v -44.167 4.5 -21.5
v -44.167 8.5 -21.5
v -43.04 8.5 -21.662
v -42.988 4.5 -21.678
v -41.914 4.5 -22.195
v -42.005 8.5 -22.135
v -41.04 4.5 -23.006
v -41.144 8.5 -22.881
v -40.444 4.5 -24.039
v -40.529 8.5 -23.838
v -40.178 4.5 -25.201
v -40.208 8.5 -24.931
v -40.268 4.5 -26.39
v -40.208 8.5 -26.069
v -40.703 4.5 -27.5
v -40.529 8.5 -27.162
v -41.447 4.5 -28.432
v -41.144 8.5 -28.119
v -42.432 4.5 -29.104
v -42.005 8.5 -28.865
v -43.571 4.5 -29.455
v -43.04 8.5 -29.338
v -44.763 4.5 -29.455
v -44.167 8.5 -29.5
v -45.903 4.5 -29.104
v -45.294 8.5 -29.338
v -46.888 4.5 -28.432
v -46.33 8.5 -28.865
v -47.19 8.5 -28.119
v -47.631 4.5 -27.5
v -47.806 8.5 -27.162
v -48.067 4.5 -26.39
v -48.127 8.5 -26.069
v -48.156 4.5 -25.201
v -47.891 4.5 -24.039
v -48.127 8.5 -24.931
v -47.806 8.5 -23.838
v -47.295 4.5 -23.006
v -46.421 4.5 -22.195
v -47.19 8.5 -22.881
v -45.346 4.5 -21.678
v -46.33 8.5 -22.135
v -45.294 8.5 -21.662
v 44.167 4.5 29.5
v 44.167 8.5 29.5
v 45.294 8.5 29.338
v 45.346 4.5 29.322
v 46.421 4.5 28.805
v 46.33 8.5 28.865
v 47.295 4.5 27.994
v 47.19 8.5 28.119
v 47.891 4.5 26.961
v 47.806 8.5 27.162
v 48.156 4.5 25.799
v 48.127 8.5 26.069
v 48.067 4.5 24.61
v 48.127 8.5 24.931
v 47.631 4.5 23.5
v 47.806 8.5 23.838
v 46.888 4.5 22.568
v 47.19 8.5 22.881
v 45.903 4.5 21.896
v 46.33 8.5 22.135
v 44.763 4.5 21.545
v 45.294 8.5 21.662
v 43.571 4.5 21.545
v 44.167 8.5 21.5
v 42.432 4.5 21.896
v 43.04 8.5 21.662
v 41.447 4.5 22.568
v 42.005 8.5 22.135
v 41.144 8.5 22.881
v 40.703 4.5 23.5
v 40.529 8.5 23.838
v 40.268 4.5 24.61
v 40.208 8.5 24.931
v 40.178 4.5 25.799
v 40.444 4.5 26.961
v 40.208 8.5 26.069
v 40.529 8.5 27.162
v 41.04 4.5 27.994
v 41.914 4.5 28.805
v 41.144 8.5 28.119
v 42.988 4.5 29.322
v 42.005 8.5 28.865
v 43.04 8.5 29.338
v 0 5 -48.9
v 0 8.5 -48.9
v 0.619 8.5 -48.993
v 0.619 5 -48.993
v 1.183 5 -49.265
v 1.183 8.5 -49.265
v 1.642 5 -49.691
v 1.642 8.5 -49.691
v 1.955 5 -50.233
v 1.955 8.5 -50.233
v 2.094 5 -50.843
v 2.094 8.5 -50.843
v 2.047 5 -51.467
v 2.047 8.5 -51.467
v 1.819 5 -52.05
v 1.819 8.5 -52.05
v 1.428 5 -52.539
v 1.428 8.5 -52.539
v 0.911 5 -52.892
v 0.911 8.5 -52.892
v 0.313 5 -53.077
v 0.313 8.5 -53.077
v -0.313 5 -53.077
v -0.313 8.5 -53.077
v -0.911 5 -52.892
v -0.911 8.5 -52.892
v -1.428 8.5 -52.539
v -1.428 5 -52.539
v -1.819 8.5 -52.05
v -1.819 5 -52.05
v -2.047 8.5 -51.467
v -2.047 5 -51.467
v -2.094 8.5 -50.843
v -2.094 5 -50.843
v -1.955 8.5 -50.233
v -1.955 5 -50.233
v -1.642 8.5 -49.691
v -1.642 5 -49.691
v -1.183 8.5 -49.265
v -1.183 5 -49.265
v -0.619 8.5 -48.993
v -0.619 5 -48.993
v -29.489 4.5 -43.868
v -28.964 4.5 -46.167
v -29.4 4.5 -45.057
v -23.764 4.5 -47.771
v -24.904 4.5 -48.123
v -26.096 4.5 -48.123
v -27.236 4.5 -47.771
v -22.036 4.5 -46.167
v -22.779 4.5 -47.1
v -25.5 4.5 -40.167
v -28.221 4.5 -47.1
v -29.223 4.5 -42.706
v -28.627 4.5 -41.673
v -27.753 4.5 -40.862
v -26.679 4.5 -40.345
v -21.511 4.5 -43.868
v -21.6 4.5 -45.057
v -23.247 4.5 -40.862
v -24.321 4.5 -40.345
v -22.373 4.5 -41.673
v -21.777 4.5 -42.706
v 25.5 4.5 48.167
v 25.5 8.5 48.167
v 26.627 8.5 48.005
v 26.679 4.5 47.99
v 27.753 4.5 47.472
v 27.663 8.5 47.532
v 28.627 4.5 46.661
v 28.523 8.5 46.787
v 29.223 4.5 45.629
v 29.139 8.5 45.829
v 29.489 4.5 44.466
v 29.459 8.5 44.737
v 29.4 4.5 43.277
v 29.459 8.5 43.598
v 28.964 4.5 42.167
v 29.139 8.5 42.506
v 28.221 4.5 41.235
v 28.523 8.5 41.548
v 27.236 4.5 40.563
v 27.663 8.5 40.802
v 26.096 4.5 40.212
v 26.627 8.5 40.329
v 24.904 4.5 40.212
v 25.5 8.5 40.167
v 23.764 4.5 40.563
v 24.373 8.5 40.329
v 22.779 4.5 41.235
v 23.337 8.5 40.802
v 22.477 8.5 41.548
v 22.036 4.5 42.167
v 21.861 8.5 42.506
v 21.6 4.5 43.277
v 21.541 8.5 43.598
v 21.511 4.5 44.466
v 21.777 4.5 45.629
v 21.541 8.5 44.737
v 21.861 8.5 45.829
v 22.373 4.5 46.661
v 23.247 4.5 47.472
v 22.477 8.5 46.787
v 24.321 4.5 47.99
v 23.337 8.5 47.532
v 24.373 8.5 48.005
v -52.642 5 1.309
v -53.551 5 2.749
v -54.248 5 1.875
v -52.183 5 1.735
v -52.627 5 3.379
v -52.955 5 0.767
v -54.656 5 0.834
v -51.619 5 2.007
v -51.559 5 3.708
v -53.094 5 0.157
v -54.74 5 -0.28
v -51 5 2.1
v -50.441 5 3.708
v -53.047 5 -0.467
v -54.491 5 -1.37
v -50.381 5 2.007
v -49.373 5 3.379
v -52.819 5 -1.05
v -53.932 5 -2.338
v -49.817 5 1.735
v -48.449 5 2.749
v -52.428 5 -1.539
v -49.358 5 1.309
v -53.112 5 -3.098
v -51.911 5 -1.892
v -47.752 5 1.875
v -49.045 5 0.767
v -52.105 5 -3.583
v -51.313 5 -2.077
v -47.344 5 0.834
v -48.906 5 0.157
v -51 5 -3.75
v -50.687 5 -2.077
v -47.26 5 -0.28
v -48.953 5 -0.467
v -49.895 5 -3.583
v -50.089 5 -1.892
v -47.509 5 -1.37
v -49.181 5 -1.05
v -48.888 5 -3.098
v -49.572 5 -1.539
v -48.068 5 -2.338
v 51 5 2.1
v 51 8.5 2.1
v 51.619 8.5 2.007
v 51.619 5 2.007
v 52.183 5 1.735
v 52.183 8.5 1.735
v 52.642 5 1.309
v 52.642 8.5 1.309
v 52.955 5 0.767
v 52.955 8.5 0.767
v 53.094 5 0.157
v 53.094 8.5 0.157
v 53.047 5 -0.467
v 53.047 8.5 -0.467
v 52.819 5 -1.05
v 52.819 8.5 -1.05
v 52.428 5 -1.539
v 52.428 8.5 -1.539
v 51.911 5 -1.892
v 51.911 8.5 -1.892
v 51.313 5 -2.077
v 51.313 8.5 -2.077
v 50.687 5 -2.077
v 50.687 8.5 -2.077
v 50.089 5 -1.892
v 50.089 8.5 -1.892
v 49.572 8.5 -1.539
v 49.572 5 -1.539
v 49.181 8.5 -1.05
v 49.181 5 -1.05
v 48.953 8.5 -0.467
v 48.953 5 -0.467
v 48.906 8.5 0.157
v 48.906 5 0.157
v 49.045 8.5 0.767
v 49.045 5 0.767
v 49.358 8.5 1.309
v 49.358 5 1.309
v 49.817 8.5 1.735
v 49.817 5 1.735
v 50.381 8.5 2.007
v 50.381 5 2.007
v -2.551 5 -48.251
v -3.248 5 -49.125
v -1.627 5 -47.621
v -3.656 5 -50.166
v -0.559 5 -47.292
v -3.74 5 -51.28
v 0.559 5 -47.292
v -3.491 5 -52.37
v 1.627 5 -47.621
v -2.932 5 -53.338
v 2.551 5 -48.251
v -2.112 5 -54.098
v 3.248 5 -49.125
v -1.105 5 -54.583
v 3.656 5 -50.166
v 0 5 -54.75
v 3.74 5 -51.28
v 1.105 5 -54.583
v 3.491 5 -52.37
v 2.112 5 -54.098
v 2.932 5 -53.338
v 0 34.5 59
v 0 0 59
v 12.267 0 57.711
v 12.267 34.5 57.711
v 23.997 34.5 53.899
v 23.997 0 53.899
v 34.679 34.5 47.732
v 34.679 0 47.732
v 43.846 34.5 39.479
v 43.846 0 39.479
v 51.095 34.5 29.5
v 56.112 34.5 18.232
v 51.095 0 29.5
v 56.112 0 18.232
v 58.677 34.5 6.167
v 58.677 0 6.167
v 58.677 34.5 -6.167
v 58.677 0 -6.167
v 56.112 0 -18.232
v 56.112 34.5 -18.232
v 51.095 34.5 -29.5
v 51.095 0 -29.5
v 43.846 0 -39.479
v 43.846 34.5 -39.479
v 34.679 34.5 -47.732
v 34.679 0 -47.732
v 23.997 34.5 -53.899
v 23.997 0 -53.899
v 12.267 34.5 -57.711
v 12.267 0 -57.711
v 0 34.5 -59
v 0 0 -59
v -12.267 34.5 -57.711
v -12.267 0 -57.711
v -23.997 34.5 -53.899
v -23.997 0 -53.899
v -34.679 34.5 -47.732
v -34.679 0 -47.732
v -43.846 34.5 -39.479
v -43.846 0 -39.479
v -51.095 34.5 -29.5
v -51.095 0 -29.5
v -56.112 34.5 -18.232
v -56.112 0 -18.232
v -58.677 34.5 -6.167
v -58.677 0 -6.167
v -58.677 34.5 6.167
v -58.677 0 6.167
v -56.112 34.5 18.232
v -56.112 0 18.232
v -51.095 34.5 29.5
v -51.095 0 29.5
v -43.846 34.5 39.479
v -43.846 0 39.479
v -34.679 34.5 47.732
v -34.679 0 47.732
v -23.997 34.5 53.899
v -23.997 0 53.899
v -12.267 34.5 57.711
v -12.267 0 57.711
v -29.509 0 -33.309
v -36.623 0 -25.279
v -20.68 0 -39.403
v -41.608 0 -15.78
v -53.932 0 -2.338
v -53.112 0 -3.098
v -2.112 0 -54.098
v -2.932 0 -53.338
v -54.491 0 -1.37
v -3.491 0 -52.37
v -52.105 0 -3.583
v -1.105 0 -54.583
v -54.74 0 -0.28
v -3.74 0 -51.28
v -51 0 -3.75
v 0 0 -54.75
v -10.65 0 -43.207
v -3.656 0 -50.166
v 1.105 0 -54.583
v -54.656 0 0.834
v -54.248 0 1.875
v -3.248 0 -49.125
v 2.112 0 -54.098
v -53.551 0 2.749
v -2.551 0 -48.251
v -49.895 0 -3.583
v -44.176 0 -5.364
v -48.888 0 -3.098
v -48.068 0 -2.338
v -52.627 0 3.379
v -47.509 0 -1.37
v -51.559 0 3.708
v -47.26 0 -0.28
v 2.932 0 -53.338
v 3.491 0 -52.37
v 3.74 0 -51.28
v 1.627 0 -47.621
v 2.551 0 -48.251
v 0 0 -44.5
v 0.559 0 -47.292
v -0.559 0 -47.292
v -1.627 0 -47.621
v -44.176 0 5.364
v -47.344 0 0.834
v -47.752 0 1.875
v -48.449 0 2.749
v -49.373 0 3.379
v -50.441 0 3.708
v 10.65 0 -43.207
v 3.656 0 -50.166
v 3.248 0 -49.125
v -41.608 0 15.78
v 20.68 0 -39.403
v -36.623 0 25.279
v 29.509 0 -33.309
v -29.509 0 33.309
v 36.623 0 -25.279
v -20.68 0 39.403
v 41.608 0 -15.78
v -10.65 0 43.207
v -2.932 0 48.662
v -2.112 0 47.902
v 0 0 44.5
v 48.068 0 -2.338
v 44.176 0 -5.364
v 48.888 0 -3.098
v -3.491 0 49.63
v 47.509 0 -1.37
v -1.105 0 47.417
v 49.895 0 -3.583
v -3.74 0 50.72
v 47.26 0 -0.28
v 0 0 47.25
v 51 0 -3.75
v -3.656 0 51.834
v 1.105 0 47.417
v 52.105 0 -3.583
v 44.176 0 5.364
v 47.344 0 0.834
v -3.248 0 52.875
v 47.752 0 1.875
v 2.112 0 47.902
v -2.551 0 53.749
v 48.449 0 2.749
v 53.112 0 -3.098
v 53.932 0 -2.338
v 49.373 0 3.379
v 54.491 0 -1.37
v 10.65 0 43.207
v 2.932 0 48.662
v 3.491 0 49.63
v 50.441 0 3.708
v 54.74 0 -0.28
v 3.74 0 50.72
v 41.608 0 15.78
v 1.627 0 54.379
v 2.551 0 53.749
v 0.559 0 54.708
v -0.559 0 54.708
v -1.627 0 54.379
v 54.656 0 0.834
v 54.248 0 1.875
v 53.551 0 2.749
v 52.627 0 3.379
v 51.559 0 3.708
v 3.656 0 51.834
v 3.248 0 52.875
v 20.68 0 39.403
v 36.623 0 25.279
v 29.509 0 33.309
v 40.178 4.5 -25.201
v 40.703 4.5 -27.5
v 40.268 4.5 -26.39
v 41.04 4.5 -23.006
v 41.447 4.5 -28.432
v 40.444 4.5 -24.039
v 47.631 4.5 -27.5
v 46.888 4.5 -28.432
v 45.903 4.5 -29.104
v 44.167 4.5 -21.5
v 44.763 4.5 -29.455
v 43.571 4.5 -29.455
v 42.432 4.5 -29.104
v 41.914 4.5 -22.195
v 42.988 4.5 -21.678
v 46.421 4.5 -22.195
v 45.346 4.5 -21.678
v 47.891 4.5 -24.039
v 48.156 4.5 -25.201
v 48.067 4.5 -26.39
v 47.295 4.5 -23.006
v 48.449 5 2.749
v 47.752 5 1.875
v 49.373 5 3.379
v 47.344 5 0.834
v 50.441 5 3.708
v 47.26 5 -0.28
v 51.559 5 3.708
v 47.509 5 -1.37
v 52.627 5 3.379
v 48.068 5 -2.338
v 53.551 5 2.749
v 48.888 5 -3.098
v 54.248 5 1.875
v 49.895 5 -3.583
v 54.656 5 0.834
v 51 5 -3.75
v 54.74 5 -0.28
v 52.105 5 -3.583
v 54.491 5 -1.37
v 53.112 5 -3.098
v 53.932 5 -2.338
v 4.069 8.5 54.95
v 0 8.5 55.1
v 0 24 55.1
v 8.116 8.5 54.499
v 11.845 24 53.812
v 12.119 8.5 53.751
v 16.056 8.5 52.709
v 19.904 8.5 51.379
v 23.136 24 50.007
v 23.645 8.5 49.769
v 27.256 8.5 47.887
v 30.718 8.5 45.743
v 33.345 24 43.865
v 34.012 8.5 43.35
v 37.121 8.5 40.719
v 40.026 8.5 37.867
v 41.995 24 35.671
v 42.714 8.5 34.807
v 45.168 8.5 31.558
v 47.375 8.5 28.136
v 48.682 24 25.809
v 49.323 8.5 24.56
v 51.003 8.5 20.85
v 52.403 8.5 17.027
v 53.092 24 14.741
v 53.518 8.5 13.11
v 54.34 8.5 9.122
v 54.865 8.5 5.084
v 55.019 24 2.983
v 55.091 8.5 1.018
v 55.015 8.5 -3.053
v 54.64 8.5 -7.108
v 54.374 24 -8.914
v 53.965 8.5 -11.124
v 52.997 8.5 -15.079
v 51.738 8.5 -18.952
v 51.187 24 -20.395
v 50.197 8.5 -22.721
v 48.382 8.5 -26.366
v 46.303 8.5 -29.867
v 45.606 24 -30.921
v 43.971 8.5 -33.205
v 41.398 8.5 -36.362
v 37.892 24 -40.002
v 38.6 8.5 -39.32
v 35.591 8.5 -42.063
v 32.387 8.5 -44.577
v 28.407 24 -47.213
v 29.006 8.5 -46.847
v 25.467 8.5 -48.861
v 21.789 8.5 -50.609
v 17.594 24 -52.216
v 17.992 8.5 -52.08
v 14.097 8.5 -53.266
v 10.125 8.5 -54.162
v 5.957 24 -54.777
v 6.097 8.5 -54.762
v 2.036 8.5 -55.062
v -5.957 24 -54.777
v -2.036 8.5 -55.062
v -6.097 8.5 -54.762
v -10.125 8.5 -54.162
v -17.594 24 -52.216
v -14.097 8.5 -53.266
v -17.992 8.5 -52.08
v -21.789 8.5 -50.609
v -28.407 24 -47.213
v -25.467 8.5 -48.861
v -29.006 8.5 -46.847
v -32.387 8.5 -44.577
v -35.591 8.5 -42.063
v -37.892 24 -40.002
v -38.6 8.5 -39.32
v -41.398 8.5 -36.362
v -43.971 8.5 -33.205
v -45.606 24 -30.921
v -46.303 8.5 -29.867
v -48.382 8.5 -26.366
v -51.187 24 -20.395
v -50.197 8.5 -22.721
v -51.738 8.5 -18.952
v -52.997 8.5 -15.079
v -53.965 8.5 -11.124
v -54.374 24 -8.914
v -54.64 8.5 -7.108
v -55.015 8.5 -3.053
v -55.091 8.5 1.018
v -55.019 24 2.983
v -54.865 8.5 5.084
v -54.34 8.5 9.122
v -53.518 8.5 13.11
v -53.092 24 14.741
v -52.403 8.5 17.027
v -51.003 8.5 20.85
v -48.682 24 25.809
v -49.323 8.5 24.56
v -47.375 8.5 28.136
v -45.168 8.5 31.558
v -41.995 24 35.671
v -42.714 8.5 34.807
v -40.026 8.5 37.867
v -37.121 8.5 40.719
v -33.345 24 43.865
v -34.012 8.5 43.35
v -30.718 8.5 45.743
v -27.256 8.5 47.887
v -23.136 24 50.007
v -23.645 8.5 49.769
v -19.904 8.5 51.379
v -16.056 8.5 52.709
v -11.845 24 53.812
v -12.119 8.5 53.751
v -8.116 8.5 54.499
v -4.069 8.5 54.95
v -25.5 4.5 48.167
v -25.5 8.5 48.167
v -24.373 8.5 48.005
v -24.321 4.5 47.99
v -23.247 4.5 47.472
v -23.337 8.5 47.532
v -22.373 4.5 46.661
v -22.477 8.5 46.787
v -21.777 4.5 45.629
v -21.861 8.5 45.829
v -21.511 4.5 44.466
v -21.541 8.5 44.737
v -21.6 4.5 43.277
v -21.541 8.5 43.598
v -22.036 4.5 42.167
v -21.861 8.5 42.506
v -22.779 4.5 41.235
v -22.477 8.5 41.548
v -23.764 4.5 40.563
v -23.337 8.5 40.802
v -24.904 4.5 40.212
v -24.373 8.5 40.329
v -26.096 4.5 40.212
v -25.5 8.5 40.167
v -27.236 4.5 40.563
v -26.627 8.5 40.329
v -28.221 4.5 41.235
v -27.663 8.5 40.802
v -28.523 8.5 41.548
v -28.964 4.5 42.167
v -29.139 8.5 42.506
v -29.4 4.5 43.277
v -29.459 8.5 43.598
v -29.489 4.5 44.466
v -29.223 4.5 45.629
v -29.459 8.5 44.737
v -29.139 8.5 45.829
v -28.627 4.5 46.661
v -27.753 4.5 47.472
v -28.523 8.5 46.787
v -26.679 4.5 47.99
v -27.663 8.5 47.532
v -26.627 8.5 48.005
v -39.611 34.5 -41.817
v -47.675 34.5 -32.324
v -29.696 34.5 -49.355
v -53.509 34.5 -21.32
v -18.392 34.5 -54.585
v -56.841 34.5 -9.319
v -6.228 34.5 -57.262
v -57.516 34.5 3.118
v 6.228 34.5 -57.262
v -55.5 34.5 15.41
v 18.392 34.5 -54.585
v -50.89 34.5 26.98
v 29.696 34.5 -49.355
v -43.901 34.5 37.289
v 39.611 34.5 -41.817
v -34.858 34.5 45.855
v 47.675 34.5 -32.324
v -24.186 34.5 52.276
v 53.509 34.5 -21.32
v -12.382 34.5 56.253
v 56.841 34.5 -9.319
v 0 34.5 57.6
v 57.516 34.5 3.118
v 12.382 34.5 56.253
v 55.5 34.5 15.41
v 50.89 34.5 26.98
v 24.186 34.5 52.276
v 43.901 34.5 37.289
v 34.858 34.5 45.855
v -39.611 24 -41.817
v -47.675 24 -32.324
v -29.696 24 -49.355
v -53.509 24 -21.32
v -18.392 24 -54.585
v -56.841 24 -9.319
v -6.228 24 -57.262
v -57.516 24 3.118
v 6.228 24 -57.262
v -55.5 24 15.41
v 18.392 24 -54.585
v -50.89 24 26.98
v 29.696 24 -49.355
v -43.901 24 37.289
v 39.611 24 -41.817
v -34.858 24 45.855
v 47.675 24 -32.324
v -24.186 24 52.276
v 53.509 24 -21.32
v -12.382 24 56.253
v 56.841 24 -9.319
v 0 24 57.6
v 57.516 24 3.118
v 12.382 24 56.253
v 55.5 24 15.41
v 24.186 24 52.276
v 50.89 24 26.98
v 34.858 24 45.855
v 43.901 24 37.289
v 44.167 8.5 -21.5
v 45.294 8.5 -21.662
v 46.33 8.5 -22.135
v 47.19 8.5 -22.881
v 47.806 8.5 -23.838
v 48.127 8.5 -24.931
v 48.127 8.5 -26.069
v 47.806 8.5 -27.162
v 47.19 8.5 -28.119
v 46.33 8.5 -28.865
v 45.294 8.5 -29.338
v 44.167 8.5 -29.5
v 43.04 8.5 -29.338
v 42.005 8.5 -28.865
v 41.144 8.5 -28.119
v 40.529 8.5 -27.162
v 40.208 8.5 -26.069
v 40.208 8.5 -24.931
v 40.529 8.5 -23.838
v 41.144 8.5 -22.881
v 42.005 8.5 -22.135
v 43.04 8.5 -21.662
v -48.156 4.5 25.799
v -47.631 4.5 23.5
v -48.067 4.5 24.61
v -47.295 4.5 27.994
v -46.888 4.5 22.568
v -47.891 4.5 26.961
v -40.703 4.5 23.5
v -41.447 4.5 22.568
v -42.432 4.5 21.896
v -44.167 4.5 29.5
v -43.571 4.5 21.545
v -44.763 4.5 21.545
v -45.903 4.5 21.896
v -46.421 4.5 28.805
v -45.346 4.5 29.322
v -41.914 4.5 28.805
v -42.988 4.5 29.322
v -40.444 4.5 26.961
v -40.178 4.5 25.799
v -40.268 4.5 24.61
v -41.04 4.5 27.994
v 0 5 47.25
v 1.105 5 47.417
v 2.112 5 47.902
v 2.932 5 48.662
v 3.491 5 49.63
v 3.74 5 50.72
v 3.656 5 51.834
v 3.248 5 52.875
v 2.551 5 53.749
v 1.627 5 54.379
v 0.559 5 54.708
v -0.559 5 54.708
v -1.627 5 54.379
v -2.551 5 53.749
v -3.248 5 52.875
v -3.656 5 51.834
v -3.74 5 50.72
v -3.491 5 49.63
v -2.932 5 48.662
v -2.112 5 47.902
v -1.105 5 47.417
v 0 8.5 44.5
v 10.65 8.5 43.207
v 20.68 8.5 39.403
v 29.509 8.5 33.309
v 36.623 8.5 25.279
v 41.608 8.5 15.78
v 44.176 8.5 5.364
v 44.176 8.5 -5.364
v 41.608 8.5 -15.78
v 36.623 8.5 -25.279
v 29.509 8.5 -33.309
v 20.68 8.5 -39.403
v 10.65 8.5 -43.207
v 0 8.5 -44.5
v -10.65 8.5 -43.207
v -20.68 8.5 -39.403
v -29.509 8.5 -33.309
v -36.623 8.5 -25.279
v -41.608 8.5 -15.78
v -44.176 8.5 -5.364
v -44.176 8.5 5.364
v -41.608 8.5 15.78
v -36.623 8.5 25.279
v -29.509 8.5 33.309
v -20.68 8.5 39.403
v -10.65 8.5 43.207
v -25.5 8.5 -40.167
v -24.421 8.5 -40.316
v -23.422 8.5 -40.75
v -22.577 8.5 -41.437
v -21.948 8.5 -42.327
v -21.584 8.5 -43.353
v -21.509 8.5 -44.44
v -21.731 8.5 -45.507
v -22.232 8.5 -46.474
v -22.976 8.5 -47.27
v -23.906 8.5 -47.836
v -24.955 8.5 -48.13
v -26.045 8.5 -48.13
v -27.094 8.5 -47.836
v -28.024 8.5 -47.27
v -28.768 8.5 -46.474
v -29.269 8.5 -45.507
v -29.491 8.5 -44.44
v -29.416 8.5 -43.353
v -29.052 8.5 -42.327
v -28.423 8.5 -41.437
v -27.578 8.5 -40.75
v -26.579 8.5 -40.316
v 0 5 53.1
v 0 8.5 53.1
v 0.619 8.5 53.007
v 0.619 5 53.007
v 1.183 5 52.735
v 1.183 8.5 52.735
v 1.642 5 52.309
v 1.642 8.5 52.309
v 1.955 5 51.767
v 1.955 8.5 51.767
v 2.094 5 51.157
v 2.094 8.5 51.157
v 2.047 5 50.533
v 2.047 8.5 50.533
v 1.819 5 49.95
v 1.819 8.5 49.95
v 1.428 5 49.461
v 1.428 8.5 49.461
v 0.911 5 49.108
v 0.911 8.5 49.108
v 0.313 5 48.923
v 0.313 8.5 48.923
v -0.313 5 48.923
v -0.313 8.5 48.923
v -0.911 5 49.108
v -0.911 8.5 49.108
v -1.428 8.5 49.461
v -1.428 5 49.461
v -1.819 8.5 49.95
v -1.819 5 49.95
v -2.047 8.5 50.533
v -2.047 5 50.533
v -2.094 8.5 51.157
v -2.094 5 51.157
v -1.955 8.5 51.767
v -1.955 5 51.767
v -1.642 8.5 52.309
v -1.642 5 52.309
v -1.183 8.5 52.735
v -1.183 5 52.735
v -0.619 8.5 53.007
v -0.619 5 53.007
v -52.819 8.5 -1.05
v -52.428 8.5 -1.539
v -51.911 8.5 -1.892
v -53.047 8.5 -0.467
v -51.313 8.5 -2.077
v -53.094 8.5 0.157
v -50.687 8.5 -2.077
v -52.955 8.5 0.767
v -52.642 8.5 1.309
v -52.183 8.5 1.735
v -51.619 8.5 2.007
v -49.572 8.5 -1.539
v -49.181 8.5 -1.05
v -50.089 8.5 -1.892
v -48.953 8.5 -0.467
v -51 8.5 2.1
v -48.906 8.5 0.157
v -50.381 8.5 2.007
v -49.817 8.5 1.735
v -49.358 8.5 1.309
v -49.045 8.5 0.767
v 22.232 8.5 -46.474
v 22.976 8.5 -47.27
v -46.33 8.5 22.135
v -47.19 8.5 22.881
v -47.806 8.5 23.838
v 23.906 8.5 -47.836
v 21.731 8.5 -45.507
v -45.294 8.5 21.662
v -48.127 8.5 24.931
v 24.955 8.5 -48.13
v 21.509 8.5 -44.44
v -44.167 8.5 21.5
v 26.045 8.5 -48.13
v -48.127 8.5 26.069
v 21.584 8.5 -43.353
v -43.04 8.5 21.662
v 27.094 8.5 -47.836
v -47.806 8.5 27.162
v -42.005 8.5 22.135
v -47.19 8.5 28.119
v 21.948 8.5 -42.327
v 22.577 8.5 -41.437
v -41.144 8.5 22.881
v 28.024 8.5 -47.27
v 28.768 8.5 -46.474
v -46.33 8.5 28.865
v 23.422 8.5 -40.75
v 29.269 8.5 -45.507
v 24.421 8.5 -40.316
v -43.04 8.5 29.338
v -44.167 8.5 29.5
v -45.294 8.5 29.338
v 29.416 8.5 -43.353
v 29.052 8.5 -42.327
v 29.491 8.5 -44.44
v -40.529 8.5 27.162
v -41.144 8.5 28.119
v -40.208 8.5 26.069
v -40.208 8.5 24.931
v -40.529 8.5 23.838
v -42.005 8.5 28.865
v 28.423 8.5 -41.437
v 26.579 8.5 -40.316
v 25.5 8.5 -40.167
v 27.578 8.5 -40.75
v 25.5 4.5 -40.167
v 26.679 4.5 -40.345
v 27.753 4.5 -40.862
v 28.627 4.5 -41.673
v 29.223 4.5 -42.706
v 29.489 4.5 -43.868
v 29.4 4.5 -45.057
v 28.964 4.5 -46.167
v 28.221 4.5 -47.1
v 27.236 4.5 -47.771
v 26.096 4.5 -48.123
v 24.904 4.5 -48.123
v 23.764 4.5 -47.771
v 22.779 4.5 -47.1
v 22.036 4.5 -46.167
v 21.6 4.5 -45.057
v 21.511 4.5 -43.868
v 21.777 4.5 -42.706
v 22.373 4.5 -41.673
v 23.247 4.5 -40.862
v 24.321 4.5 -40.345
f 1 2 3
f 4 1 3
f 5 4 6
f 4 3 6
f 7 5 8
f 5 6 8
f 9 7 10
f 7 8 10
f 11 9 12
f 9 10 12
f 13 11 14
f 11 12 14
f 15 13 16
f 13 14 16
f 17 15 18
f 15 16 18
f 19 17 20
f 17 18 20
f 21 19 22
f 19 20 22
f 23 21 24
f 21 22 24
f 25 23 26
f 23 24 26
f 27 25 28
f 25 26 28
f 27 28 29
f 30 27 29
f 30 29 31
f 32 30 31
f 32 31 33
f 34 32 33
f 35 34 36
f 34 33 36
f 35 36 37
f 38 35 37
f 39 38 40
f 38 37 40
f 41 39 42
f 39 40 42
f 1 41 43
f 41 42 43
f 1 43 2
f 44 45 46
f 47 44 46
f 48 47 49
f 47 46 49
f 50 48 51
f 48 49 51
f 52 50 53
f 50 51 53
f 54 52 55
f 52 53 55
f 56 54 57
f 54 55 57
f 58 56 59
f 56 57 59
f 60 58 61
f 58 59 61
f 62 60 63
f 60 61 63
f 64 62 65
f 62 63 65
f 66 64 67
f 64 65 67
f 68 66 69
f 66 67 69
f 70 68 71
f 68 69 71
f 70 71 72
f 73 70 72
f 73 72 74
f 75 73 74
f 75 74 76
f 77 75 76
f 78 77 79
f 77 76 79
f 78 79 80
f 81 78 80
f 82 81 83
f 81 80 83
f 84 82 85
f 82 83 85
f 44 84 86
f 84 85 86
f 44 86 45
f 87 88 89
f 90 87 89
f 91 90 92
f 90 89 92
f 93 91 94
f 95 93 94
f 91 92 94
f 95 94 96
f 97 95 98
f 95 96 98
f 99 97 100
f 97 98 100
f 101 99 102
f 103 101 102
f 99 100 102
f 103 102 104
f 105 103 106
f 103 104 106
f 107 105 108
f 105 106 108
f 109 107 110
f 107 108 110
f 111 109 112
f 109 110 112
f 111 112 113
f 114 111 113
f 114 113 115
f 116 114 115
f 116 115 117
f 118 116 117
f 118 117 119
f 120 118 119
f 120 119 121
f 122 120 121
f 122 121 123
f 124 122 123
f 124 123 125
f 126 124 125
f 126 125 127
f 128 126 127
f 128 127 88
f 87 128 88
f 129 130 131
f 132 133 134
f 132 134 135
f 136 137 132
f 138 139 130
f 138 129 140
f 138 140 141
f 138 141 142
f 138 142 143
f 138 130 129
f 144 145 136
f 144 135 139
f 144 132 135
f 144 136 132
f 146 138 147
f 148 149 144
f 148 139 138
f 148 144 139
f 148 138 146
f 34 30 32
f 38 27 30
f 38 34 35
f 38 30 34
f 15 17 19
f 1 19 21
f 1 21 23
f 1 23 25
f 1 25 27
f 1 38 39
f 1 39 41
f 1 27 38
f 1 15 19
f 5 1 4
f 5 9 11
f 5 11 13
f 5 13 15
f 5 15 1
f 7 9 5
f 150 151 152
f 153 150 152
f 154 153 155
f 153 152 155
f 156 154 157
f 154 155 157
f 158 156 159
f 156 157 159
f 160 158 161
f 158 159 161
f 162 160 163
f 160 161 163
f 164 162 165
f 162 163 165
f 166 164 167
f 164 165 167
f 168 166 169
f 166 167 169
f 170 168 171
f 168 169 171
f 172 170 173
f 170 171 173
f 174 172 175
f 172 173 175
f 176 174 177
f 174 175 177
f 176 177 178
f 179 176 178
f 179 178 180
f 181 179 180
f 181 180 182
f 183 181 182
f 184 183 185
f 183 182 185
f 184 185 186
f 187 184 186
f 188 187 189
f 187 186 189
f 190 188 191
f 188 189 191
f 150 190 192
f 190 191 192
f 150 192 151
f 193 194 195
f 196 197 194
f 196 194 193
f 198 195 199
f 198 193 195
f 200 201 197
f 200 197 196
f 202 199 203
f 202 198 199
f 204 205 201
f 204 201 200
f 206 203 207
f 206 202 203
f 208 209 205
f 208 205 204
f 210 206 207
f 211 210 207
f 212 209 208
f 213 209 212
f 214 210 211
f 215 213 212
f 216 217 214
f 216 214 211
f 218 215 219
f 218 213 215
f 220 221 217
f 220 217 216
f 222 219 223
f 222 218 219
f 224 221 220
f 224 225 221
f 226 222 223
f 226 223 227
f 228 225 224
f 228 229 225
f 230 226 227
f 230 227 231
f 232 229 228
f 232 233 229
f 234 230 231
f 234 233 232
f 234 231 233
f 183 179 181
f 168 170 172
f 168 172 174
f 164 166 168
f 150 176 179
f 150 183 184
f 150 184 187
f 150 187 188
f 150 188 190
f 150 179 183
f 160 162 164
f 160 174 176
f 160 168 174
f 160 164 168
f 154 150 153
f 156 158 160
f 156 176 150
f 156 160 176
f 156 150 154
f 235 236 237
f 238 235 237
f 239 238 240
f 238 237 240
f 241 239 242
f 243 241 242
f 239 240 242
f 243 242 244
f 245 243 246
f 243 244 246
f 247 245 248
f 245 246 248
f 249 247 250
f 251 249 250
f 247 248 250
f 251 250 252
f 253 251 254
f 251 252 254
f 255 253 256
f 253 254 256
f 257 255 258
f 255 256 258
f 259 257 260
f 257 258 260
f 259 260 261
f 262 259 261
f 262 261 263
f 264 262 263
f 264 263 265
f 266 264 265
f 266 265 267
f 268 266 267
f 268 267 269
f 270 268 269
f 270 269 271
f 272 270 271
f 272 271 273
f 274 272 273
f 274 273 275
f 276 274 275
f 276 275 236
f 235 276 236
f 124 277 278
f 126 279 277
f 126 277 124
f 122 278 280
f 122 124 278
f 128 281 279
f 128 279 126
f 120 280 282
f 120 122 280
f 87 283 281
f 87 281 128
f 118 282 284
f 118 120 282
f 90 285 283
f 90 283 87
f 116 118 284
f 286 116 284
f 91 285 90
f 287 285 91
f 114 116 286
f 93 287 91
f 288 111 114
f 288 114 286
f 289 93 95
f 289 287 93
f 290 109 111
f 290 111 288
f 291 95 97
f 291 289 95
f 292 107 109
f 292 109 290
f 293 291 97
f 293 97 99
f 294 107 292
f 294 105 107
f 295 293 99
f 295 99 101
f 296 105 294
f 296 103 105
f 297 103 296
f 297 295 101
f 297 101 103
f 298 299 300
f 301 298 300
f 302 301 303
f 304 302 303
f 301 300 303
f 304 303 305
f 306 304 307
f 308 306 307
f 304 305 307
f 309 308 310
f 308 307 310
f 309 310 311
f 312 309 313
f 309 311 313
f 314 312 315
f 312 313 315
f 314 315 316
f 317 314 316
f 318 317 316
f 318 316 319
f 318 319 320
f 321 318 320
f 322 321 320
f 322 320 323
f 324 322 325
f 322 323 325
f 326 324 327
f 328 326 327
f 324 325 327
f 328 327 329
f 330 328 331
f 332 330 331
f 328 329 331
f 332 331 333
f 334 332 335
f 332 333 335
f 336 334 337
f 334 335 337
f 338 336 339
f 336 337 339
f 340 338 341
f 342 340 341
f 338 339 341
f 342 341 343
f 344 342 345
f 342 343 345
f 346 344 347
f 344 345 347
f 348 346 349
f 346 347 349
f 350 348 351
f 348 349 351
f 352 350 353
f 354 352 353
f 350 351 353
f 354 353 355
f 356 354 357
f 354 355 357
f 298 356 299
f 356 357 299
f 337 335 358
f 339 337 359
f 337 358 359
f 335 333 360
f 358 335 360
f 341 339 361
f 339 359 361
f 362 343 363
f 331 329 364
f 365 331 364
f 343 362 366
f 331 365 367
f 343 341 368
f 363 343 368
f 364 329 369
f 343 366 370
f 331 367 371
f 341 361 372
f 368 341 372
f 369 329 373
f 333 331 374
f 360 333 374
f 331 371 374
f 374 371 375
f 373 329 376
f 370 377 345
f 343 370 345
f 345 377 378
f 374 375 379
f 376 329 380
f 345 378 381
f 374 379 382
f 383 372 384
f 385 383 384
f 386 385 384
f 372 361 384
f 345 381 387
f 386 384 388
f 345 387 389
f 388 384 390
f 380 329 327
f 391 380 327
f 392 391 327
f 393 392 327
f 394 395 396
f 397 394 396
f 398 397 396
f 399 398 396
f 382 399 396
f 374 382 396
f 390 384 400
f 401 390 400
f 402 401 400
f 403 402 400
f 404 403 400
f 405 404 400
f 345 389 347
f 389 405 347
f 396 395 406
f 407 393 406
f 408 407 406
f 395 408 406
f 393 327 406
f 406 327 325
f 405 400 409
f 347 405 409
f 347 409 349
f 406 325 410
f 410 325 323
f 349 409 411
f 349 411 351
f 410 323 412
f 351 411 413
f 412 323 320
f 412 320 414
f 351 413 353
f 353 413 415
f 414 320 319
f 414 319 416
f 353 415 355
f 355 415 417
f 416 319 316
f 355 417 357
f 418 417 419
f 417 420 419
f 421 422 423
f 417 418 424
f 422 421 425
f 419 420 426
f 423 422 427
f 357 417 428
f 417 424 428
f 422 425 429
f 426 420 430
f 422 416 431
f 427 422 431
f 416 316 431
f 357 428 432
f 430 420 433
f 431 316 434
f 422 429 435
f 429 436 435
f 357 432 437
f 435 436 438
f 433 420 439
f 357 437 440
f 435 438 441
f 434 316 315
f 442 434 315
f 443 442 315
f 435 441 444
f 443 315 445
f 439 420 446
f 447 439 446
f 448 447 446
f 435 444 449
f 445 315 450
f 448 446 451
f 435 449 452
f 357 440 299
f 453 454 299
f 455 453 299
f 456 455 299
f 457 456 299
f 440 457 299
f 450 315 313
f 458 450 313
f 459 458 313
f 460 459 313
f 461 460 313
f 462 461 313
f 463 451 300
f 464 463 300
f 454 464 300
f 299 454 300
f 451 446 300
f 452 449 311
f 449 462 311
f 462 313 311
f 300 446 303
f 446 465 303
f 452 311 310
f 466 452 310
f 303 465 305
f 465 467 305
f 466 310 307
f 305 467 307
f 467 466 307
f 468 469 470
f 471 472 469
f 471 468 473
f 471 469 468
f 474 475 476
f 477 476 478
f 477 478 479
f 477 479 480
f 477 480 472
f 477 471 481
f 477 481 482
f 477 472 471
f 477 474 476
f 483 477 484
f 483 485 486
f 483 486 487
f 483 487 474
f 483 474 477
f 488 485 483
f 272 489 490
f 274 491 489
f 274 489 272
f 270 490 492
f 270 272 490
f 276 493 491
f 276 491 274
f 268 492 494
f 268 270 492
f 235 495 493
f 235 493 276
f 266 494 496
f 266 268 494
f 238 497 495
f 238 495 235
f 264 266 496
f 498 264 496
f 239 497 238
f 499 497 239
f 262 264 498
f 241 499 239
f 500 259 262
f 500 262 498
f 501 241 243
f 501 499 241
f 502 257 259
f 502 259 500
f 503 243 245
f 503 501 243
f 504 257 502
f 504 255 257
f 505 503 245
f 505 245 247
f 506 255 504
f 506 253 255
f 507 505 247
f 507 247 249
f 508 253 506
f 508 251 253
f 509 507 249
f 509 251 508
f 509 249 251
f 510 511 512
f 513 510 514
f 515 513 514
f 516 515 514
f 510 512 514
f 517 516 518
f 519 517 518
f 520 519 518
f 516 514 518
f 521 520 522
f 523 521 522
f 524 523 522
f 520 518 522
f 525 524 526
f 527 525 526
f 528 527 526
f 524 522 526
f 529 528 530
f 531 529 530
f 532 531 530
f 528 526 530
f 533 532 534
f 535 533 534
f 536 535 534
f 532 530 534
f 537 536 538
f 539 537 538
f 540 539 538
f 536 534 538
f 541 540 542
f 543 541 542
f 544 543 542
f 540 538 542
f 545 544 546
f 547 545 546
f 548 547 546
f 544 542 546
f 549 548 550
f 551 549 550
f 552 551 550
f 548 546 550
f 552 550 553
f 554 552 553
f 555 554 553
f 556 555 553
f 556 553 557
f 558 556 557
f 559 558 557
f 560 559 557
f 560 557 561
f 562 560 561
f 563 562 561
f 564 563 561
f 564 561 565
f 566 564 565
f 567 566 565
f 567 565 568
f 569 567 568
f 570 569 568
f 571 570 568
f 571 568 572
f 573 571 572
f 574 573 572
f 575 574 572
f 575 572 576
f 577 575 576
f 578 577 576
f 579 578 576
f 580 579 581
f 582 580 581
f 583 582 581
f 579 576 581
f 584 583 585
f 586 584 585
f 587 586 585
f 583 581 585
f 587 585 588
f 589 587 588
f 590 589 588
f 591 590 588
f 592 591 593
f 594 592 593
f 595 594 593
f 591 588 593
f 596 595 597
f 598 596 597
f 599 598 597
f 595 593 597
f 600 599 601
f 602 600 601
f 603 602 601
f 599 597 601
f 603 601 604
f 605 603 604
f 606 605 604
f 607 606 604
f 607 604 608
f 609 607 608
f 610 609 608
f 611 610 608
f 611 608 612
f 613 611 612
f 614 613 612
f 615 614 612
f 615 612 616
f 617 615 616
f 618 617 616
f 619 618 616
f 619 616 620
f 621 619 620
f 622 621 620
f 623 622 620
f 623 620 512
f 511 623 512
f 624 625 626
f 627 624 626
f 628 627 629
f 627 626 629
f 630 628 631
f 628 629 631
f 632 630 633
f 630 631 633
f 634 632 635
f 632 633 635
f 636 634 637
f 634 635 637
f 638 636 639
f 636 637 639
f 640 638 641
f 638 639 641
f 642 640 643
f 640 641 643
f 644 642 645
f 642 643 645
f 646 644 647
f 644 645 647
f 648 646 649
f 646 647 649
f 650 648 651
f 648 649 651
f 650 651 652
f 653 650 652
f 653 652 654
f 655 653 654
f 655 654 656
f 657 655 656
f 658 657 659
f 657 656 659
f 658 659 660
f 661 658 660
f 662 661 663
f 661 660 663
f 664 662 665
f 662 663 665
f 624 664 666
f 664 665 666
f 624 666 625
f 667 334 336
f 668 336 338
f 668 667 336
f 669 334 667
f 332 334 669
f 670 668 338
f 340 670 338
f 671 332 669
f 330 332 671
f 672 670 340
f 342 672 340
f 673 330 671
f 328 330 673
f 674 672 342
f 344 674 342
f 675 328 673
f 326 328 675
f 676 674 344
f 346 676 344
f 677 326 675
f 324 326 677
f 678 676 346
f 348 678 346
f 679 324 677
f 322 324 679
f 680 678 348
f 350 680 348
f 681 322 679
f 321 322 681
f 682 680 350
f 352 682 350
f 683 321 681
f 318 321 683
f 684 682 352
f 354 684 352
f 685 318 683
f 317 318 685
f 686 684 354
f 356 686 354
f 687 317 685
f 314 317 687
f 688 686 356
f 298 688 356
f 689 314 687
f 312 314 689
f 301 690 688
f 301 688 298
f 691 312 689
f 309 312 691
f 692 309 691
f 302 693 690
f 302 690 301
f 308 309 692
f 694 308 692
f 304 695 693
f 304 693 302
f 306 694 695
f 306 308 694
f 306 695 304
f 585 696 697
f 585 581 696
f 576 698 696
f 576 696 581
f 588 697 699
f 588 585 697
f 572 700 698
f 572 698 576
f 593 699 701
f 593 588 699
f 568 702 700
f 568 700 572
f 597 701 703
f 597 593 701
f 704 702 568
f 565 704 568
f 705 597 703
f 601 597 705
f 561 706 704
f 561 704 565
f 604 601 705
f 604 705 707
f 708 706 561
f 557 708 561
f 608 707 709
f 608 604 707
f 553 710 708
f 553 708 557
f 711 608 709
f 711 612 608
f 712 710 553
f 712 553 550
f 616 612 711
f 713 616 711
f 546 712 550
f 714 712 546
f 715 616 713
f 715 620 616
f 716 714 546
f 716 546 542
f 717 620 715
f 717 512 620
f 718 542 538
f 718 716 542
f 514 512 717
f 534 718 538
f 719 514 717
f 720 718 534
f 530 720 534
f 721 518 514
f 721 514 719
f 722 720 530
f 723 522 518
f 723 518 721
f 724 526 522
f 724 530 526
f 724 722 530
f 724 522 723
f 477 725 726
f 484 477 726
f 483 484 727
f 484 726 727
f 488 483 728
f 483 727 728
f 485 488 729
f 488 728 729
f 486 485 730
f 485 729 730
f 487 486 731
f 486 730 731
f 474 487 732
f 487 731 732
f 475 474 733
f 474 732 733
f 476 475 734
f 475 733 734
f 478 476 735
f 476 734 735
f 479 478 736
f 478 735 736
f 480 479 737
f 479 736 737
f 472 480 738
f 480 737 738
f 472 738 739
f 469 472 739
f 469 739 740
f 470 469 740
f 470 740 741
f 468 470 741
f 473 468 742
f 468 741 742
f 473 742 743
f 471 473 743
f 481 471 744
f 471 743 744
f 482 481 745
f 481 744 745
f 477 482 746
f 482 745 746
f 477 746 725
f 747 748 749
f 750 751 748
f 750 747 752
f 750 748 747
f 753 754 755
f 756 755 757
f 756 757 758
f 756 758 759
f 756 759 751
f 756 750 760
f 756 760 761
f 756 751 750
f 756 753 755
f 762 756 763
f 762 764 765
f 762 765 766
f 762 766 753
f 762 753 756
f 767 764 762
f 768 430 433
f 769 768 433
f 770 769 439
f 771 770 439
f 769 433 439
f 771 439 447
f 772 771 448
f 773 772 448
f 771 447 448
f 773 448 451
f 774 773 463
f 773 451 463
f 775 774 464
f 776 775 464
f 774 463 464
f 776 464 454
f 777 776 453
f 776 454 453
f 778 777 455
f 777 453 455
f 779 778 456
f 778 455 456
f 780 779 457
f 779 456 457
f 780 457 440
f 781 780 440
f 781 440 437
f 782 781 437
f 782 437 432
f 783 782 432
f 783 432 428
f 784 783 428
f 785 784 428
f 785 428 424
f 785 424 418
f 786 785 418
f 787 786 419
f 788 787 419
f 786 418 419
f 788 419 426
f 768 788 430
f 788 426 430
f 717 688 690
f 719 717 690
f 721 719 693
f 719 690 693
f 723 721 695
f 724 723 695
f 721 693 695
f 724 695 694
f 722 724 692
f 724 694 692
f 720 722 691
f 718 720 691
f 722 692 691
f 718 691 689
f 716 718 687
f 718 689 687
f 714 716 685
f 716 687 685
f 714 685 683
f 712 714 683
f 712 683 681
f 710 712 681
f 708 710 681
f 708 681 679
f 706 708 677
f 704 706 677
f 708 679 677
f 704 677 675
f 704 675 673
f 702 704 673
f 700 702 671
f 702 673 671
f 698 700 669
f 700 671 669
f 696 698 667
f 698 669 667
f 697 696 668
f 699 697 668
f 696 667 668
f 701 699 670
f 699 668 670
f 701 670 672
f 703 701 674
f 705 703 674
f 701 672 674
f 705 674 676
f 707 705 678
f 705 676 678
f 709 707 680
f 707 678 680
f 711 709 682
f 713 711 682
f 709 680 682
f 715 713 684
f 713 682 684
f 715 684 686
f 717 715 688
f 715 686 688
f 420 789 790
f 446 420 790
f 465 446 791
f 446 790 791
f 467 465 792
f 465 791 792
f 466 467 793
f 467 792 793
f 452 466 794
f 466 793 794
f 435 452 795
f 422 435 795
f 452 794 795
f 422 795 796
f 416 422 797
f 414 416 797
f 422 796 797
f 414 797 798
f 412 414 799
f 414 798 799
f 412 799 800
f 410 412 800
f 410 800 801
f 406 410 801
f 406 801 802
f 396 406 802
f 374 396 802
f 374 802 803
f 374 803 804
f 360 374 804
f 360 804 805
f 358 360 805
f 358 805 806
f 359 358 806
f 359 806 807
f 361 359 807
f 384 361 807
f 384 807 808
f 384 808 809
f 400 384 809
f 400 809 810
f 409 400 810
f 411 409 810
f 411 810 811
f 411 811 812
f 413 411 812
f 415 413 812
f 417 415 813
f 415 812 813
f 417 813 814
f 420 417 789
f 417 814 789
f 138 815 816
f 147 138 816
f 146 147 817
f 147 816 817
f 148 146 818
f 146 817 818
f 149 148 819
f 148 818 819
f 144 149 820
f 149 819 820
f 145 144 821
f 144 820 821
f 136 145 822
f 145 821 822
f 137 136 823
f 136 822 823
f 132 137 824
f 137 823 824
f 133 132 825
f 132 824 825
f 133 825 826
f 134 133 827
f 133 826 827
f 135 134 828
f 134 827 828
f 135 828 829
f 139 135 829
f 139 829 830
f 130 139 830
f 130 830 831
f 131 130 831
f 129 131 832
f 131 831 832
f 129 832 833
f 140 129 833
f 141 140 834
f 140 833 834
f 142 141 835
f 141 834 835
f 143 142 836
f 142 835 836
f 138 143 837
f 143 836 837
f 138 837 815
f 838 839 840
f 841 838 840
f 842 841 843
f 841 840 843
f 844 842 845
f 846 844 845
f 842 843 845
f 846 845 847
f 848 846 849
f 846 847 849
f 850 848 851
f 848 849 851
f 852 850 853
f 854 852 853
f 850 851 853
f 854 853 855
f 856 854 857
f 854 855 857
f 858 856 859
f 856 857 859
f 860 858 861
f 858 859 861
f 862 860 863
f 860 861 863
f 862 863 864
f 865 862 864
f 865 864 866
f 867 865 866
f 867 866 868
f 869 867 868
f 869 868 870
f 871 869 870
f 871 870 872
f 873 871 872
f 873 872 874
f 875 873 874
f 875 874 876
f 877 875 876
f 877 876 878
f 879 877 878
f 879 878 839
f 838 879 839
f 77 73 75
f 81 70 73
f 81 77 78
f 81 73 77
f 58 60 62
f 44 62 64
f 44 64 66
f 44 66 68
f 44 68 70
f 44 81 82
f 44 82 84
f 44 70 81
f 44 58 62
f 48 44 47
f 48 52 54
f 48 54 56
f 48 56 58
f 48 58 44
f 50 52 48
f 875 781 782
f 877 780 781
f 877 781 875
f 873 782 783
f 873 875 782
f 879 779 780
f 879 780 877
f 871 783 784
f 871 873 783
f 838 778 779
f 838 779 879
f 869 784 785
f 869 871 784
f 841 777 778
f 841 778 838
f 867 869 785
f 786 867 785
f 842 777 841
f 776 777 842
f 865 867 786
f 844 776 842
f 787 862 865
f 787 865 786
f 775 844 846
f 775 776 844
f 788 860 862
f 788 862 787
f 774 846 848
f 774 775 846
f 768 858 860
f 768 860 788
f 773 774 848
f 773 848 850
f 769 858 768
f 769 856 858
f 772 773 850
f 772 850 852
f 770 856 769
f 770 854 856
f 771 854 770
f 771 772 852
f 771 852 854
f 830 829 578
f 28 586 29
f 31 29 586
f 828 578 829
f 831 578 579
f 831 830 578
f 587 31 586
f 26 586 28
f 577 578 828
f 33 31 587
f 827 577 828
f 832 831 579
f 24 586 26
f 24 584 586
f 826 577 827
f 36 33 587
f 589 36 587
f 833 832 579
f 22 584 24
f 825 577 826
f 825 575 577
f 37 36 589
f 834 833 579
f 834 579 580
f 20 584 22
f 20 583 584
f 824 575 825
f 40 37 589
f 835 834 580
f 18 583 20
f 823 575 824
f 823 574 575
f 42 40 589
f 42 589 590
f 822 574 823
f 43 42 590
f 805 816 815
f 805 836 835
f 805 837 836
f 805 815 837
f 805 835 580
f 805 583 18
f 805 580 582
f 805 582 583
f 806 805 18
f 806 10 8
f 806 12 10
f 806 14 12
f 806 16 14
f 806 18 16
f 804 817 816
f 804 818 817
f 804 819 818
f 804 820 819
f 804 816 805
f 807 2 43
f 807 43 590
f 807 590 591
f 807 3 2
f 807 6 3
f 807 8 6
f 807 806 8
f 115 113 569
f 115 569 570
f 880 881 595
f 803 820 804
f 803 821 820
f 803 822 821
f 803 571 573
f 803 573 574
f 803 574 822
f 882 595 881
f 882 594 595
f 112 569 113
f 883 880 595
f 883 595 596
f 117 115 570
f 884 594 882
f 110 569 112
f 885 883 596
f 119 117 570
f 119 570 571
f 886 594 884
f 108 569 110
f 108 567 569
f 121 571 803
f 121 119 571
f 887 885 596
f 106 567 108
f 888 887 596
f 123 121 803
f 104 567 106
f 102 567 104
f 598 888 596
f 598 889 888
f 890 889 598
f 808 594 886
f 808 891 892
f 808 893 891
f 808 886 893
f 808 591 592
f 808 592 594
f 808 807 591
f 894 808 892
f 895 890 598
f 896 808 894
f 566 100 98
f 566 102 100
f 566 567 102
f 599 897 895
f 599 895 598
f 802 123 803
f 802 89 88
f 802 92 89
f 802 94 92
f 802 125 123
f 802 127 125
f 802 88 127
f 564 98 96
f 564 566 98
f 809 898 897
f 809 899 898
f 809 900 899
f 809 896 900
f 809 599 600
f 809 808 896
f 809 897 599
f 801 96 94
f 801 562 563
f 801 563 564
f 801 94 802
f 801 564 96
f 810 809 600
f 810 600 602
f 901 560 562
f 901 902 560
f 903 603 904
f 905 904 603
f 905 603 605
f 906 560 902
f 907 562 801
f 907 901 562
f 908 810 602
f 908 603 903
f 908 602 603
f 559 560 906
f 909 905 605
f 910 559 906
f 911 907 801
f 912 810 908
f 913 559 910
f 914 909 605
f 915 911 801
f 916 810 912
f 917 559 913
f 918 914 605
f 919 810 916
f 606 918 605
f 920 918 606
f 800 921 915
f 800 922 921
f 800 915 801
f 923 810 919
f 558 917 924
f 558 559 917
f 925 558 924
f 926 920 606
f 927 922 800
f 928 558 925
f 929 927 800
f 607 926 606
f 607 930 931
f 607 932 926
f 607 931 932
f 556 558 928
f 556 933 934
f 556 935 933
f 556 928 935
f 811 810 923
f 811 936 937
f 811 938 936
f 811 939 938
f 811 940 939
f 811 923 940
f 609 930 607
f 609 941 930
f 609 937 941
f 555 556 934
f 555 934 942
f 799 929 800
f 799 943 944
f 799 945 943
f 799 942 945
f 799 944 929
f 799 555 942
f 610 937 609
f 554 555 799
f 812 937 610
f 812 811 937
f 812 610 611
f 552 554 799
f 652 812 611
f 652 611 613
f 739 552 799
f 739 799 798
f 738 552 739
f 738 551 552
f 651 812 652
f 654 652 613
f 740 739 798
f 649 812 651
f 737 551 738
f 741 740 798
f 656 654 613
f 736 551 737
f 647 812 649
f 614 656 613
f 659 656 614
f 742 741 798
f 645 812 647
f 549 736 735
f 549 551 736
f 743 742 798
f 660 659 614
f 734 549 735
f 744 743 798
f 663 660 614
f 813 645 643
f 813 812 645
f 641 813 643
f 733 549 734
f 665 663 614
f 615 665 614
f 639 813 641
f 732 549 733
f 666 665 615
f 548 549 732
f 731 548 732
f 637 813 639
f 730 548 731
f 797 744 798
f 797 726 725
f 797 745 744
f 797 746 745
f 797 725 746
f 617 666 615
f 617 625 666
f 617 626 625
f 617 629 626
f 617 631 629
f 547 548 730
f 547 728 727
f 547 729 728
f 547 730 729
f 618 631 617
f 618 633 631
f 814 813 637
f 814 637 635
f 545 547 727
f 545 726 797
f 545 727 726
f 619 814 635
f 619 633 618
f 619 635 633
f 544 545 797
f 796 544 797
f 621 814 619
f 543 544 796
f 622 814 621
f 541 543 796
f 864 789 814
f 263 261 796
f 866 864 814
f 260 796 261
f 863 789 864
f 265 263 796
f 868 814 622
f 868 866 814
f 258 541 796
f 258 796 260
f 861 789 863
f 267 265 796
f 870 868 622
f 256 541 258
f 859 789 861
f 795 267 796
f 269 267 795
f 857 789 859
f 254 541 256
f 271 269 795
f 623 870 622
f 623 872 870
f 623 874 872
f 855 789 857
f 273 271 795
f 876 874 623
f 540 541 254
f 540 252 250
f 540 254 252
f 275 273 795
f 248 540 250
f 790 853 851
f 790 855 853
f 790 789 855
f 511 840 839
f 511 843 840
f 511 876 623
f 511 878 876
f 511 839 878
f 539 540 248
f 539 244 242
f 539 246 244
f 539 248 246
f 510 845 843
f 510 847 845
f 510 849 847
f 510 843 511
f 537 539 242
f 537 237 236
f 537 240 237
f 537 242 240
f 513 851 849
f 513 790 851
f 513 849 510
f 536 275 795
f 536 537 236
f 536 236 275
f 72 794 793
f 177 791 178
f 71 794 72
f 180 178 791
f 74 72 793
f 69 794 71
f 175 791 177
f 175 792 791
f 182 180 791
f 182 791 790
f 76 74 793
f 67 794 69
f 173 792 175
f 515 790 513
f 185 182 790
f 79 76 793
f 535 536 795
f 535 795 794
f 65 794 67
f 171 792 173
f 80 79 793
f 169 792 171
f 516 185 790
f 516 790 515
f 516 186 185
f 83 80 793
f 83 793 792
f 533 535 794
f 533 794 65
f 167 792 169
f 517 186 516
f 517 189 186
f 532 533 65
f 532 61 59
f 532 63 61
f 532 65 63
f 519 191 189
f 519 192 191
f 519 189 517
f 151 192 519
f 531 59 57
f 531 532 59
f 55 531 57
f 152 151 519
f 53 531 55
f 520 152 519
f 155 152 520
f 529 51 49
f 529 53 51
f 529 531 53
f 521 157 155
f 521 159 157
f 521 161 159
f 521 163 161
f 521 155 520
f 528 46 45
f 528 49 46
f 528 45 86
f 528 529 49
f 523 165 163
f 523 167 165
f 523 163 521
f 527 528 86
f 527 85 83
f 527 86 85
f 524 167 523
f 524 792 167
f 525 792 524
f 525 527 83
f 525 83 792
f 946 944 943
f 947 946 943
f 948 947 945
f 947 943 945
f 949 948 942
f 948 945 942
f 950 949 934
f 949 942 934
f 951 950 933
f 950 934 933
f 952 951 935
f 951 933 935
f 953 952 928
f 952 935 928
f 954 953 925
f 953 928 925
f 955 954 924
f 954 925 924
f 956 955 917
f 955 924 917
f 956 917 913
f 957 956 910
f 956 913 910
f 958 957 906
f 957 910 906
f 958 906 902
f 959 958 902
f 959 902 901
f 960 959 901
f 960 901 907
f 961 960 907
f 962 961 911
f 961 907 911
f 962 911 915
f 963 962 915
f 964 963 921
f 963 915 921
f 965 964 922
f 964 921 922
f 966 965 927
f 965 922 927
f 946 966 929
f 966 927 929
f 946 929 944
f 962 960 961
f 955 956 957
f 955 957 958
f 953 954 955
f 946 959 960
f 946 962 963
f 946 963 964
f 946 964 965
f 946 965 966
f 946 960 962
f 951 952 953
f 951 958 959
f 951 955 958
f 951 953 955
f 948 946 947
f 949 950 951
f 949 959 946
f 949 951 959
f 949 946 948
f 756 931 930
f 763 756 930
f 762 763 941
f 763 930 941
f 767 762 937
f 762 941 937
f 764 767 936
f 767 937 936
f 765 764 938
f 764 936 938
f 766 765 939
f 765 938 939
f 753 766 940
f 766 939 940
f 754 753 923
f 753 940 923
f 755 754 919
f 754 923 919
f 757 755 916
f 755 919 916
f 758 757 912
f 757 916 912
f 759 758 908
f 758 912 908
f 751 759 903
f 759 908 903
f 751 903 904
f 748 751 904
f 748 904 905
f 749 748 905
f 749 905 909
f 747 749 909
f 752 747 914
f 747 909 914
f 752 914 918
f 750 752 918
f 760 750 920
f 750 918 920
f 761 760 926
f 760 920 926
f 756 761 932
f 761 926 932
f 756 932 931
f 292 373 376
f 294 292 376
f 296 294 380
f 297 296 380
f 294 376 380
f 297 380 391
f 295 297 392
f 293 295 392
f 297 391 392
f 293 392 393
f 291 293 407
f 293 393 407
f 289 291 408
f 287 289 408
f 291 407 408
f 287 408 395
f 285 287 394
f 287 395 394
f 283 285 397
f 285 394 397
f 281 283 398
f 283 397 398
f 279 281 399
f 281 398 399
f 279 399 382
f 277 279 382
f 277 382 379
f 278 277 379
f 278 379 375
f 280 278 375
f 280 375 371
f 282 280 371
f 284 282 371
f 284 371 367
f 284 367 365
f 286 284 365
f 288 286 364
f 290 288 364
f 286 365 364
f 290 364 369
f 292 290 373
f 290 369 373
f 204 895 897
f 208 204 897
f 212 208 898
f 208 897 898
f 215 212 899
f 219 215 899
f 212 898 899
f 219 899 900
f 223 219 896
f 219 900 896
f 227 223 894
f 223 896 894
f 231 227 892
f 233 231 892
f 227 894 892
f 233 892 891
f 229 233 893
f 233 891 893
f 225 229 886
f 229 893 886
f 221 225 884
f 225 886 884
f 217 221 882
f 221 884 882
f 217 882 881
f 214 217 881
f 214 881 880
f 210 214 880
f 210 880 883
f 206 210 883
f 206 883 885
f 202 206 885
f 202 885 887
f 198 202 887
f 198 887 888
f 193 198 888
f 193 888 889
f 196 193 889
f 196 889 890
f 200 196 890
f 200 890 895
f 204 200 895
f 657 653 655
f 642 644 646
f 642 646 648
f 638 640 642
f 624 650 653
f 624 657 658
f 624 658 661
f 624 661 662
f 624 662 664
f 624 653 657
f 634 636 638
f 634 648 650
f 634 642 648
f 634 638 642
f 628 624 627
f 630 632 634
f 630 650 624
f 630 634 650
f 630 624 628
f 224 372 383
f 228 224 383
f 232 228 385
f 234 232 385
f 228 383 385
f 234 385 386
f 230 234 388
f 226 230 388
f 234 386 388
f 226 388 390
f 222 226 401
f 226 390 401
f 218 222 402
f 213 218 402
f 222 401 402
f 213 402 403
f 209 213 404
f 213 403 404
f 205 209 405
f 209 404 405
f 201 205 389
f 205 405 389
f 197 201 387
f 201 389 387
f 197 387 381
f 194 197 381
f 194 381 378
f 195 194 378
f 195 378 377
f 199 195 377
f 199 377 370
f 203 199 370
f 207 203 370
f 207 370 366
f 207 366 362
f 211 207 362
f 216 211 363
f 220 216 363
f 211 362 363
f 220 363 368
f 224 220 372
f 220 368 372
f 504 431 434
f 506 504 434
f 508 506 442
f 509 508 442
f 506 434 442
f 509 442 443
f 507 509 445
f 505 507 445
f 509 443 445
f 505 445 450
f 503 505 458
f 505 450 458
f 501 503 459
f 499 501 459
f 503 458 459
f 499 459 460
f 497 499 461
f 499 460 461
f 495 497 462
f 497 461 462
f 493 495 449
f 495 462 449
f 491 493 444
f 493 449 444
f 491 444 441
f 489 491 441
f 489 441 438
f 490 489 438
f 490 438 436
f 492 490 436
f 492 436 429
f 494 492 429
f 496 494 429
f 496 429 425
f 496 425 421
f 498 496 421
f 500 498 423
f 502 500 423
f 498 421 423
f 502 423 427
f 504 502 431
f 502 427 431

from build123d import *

# Parameters (mm, degrees)
SKETCH_1_R          = 59
EXTRUDE_1_DEPTH     = 34.5
SKETCH_2_R          = 57.6
CUT_EXTRUDE_1_DEPTH = 10.5
SKETCH_3_R          = 55.1
CUT_EXTRUDE_2_DEPTH = 15.5
SKETCH_4_R          = 44.5
CUT_EXTRUDE_3_DEPTH = 88.395652066
SKETCH_9_R          = 4
CUT_EXTRUDE_7_DEPTH = 4
SKETCH_10_R         = 2.1
CUT_EXTRUDE_8_DEPTH = 88.395652066
SKETCH_11_R         = 3.75
CUT_EXTRUDE_9_DEPTH = 5


with BuildPart() as part:
    # 草图1 → 凸台-拉伸1 (new body)
    with BuildSketch(Plane(origin=(0, 0, 0), x_dir=(1, 0, 0), z_dir=(0, 1, 0))):
        with Locations(Location((0, 0, 0), (0, 0, 270))):
            Circle(SKETCH_1_R)
    extrude(amount=EXTRUDE_1_DEPTH)

    # 草图2 → 切除-拉伸1 (cut)
    with BuildSketch(Plane(origin=(0, 34.5, 0), x_dir=(1, 0, 0), z_dir=(0, 1, 0))):
        with Locations(Location((0, 0, 0), (0, 0, 270))):
            Circle(SKETCH_2_R)
    extrude(amount=-CUT_EXTRUDE_1_DEPTH, mode=Mode.SUBTRACT)

    # 草图3 → 切除-拉伸2 (cut)
    with BuildSketch(Plane(origin=(0, 24, 0), x_dir=(1, 0, 0), z_dir=(0, 1, 0))):
        with Locations(Location((0, 0, 0), (0, 0, 270))):
            Circle(SKETCH_3_R)
    extrude(amount=-CUT_EXTRUDE_2_DEPTH, mode=Mode.SUBTRACT)

    # 草图4 → 切除-拉伸3 (cut, through all)
    with BuildSketch(Plane(origin=(0, 8.5, 0), x_dir=(1, 0, 0), z_dir=(0, 1, 0))):
        with Locations(Location((0, 0, 0), (0, 0, 270))):
            Circle(SKETCH_4_R)
    extrude(amount=-CUT_EXTRUDE_3_DEPTH, mode=Mode.SUBTRACT)

    # 草图9 → 切除-拉伸7 (cut)
    with BuildSketch(Plane(origin=(0, 8.5, 0), x_dir=(1, 0, 0), z_dir=(0, 1, 0))):
        with Locations(Location((-44.167295593, 25.5, 0), (0, 0, 270))):
            Circle(SKETCH_9_R)
        with Locations(Location((-25.5, 44.167295593, 0), (0, 0, 270))):
            Circle(SKETCH_9_R)
        with Locations(Location((25.5, 44.167295593, 0), (0, 0, 270))):
            Circle(SKETCH_9_R)
        with Locations(Location((44.167295593, 25.5, 0), (0, 0, 270))):
            Circle(SKETCH_9_R)
        with Locations(Location((44.167295593, -25.5, 0), (0, 0, 270))):
            Circle(SKETCH_9_R)
        with Locations(Location((25.5, -44.167295593, 0), (0, 0, 270))):
            Circle(SKETCH_9_R)
        with Locations(Location((-25.5, -44.167295593, 0), (0, 0, 270))):
            Circle(SKETCH_9_R)
        with Locations(Location((-44.167295593, -25.5, 0), (0, 0, 270))):
            Circle(SKETCH_9_R)
    extrude(amount=-CUT_EXTRUDE_7_DEPTH, mode=Mode.SUBTRACT)

    # 草图10 → 切除-拉伸8 (cut, through all)
    with BuildSketch(Plane(origin=(0, 8.5, 0), x_dir=(1, 0, 0), z_dir=(0, 1, 0))):
        with Locations(Location((0, 51, 0), (0, 0, 270))):
            Circle(SKETCH_10_R)
        with Locations(Location((51, 0, 0), (0, 0, 270))):
            Circle(SKETCH_10_R)
        with Locations(Location((0, -51, 0), (0, 0, 270))):
            Circle(SKETCH_10_R)
        with Locations(Location((-51, 0, 0), (0, 0, 270))):
            Circle(SKETCH_10_R)
    extrude(amount=-CUT_EXTRUDE_8_DEPTH, mode=Mode.SUBTRACT)

    # 草图11 → 切除-拉伸9 (cut)
    with BuildSketch(Plane.XZ):
        with Locations(Location((0, 51, 0), (0, 0, 270))):
            Circle(SKETCH_11_R)
        with Locations(Location((51, 0, 0), (0, 0, 270))):
            Circle(SKETCH_11_R)
        with Locations(Location((0, -51, 0), (0, 0, 270))):
            Circle(SKETCH_11_R)
        with Locations(Location((-51, 0, 0), (0, 0, 270))):
            Circle(SKETCH_11_R)
    extrude(amount=-CUT_EXTRUDE_9_DEPTH, mode=Mode.SUBTRACT)


solid = part.part
